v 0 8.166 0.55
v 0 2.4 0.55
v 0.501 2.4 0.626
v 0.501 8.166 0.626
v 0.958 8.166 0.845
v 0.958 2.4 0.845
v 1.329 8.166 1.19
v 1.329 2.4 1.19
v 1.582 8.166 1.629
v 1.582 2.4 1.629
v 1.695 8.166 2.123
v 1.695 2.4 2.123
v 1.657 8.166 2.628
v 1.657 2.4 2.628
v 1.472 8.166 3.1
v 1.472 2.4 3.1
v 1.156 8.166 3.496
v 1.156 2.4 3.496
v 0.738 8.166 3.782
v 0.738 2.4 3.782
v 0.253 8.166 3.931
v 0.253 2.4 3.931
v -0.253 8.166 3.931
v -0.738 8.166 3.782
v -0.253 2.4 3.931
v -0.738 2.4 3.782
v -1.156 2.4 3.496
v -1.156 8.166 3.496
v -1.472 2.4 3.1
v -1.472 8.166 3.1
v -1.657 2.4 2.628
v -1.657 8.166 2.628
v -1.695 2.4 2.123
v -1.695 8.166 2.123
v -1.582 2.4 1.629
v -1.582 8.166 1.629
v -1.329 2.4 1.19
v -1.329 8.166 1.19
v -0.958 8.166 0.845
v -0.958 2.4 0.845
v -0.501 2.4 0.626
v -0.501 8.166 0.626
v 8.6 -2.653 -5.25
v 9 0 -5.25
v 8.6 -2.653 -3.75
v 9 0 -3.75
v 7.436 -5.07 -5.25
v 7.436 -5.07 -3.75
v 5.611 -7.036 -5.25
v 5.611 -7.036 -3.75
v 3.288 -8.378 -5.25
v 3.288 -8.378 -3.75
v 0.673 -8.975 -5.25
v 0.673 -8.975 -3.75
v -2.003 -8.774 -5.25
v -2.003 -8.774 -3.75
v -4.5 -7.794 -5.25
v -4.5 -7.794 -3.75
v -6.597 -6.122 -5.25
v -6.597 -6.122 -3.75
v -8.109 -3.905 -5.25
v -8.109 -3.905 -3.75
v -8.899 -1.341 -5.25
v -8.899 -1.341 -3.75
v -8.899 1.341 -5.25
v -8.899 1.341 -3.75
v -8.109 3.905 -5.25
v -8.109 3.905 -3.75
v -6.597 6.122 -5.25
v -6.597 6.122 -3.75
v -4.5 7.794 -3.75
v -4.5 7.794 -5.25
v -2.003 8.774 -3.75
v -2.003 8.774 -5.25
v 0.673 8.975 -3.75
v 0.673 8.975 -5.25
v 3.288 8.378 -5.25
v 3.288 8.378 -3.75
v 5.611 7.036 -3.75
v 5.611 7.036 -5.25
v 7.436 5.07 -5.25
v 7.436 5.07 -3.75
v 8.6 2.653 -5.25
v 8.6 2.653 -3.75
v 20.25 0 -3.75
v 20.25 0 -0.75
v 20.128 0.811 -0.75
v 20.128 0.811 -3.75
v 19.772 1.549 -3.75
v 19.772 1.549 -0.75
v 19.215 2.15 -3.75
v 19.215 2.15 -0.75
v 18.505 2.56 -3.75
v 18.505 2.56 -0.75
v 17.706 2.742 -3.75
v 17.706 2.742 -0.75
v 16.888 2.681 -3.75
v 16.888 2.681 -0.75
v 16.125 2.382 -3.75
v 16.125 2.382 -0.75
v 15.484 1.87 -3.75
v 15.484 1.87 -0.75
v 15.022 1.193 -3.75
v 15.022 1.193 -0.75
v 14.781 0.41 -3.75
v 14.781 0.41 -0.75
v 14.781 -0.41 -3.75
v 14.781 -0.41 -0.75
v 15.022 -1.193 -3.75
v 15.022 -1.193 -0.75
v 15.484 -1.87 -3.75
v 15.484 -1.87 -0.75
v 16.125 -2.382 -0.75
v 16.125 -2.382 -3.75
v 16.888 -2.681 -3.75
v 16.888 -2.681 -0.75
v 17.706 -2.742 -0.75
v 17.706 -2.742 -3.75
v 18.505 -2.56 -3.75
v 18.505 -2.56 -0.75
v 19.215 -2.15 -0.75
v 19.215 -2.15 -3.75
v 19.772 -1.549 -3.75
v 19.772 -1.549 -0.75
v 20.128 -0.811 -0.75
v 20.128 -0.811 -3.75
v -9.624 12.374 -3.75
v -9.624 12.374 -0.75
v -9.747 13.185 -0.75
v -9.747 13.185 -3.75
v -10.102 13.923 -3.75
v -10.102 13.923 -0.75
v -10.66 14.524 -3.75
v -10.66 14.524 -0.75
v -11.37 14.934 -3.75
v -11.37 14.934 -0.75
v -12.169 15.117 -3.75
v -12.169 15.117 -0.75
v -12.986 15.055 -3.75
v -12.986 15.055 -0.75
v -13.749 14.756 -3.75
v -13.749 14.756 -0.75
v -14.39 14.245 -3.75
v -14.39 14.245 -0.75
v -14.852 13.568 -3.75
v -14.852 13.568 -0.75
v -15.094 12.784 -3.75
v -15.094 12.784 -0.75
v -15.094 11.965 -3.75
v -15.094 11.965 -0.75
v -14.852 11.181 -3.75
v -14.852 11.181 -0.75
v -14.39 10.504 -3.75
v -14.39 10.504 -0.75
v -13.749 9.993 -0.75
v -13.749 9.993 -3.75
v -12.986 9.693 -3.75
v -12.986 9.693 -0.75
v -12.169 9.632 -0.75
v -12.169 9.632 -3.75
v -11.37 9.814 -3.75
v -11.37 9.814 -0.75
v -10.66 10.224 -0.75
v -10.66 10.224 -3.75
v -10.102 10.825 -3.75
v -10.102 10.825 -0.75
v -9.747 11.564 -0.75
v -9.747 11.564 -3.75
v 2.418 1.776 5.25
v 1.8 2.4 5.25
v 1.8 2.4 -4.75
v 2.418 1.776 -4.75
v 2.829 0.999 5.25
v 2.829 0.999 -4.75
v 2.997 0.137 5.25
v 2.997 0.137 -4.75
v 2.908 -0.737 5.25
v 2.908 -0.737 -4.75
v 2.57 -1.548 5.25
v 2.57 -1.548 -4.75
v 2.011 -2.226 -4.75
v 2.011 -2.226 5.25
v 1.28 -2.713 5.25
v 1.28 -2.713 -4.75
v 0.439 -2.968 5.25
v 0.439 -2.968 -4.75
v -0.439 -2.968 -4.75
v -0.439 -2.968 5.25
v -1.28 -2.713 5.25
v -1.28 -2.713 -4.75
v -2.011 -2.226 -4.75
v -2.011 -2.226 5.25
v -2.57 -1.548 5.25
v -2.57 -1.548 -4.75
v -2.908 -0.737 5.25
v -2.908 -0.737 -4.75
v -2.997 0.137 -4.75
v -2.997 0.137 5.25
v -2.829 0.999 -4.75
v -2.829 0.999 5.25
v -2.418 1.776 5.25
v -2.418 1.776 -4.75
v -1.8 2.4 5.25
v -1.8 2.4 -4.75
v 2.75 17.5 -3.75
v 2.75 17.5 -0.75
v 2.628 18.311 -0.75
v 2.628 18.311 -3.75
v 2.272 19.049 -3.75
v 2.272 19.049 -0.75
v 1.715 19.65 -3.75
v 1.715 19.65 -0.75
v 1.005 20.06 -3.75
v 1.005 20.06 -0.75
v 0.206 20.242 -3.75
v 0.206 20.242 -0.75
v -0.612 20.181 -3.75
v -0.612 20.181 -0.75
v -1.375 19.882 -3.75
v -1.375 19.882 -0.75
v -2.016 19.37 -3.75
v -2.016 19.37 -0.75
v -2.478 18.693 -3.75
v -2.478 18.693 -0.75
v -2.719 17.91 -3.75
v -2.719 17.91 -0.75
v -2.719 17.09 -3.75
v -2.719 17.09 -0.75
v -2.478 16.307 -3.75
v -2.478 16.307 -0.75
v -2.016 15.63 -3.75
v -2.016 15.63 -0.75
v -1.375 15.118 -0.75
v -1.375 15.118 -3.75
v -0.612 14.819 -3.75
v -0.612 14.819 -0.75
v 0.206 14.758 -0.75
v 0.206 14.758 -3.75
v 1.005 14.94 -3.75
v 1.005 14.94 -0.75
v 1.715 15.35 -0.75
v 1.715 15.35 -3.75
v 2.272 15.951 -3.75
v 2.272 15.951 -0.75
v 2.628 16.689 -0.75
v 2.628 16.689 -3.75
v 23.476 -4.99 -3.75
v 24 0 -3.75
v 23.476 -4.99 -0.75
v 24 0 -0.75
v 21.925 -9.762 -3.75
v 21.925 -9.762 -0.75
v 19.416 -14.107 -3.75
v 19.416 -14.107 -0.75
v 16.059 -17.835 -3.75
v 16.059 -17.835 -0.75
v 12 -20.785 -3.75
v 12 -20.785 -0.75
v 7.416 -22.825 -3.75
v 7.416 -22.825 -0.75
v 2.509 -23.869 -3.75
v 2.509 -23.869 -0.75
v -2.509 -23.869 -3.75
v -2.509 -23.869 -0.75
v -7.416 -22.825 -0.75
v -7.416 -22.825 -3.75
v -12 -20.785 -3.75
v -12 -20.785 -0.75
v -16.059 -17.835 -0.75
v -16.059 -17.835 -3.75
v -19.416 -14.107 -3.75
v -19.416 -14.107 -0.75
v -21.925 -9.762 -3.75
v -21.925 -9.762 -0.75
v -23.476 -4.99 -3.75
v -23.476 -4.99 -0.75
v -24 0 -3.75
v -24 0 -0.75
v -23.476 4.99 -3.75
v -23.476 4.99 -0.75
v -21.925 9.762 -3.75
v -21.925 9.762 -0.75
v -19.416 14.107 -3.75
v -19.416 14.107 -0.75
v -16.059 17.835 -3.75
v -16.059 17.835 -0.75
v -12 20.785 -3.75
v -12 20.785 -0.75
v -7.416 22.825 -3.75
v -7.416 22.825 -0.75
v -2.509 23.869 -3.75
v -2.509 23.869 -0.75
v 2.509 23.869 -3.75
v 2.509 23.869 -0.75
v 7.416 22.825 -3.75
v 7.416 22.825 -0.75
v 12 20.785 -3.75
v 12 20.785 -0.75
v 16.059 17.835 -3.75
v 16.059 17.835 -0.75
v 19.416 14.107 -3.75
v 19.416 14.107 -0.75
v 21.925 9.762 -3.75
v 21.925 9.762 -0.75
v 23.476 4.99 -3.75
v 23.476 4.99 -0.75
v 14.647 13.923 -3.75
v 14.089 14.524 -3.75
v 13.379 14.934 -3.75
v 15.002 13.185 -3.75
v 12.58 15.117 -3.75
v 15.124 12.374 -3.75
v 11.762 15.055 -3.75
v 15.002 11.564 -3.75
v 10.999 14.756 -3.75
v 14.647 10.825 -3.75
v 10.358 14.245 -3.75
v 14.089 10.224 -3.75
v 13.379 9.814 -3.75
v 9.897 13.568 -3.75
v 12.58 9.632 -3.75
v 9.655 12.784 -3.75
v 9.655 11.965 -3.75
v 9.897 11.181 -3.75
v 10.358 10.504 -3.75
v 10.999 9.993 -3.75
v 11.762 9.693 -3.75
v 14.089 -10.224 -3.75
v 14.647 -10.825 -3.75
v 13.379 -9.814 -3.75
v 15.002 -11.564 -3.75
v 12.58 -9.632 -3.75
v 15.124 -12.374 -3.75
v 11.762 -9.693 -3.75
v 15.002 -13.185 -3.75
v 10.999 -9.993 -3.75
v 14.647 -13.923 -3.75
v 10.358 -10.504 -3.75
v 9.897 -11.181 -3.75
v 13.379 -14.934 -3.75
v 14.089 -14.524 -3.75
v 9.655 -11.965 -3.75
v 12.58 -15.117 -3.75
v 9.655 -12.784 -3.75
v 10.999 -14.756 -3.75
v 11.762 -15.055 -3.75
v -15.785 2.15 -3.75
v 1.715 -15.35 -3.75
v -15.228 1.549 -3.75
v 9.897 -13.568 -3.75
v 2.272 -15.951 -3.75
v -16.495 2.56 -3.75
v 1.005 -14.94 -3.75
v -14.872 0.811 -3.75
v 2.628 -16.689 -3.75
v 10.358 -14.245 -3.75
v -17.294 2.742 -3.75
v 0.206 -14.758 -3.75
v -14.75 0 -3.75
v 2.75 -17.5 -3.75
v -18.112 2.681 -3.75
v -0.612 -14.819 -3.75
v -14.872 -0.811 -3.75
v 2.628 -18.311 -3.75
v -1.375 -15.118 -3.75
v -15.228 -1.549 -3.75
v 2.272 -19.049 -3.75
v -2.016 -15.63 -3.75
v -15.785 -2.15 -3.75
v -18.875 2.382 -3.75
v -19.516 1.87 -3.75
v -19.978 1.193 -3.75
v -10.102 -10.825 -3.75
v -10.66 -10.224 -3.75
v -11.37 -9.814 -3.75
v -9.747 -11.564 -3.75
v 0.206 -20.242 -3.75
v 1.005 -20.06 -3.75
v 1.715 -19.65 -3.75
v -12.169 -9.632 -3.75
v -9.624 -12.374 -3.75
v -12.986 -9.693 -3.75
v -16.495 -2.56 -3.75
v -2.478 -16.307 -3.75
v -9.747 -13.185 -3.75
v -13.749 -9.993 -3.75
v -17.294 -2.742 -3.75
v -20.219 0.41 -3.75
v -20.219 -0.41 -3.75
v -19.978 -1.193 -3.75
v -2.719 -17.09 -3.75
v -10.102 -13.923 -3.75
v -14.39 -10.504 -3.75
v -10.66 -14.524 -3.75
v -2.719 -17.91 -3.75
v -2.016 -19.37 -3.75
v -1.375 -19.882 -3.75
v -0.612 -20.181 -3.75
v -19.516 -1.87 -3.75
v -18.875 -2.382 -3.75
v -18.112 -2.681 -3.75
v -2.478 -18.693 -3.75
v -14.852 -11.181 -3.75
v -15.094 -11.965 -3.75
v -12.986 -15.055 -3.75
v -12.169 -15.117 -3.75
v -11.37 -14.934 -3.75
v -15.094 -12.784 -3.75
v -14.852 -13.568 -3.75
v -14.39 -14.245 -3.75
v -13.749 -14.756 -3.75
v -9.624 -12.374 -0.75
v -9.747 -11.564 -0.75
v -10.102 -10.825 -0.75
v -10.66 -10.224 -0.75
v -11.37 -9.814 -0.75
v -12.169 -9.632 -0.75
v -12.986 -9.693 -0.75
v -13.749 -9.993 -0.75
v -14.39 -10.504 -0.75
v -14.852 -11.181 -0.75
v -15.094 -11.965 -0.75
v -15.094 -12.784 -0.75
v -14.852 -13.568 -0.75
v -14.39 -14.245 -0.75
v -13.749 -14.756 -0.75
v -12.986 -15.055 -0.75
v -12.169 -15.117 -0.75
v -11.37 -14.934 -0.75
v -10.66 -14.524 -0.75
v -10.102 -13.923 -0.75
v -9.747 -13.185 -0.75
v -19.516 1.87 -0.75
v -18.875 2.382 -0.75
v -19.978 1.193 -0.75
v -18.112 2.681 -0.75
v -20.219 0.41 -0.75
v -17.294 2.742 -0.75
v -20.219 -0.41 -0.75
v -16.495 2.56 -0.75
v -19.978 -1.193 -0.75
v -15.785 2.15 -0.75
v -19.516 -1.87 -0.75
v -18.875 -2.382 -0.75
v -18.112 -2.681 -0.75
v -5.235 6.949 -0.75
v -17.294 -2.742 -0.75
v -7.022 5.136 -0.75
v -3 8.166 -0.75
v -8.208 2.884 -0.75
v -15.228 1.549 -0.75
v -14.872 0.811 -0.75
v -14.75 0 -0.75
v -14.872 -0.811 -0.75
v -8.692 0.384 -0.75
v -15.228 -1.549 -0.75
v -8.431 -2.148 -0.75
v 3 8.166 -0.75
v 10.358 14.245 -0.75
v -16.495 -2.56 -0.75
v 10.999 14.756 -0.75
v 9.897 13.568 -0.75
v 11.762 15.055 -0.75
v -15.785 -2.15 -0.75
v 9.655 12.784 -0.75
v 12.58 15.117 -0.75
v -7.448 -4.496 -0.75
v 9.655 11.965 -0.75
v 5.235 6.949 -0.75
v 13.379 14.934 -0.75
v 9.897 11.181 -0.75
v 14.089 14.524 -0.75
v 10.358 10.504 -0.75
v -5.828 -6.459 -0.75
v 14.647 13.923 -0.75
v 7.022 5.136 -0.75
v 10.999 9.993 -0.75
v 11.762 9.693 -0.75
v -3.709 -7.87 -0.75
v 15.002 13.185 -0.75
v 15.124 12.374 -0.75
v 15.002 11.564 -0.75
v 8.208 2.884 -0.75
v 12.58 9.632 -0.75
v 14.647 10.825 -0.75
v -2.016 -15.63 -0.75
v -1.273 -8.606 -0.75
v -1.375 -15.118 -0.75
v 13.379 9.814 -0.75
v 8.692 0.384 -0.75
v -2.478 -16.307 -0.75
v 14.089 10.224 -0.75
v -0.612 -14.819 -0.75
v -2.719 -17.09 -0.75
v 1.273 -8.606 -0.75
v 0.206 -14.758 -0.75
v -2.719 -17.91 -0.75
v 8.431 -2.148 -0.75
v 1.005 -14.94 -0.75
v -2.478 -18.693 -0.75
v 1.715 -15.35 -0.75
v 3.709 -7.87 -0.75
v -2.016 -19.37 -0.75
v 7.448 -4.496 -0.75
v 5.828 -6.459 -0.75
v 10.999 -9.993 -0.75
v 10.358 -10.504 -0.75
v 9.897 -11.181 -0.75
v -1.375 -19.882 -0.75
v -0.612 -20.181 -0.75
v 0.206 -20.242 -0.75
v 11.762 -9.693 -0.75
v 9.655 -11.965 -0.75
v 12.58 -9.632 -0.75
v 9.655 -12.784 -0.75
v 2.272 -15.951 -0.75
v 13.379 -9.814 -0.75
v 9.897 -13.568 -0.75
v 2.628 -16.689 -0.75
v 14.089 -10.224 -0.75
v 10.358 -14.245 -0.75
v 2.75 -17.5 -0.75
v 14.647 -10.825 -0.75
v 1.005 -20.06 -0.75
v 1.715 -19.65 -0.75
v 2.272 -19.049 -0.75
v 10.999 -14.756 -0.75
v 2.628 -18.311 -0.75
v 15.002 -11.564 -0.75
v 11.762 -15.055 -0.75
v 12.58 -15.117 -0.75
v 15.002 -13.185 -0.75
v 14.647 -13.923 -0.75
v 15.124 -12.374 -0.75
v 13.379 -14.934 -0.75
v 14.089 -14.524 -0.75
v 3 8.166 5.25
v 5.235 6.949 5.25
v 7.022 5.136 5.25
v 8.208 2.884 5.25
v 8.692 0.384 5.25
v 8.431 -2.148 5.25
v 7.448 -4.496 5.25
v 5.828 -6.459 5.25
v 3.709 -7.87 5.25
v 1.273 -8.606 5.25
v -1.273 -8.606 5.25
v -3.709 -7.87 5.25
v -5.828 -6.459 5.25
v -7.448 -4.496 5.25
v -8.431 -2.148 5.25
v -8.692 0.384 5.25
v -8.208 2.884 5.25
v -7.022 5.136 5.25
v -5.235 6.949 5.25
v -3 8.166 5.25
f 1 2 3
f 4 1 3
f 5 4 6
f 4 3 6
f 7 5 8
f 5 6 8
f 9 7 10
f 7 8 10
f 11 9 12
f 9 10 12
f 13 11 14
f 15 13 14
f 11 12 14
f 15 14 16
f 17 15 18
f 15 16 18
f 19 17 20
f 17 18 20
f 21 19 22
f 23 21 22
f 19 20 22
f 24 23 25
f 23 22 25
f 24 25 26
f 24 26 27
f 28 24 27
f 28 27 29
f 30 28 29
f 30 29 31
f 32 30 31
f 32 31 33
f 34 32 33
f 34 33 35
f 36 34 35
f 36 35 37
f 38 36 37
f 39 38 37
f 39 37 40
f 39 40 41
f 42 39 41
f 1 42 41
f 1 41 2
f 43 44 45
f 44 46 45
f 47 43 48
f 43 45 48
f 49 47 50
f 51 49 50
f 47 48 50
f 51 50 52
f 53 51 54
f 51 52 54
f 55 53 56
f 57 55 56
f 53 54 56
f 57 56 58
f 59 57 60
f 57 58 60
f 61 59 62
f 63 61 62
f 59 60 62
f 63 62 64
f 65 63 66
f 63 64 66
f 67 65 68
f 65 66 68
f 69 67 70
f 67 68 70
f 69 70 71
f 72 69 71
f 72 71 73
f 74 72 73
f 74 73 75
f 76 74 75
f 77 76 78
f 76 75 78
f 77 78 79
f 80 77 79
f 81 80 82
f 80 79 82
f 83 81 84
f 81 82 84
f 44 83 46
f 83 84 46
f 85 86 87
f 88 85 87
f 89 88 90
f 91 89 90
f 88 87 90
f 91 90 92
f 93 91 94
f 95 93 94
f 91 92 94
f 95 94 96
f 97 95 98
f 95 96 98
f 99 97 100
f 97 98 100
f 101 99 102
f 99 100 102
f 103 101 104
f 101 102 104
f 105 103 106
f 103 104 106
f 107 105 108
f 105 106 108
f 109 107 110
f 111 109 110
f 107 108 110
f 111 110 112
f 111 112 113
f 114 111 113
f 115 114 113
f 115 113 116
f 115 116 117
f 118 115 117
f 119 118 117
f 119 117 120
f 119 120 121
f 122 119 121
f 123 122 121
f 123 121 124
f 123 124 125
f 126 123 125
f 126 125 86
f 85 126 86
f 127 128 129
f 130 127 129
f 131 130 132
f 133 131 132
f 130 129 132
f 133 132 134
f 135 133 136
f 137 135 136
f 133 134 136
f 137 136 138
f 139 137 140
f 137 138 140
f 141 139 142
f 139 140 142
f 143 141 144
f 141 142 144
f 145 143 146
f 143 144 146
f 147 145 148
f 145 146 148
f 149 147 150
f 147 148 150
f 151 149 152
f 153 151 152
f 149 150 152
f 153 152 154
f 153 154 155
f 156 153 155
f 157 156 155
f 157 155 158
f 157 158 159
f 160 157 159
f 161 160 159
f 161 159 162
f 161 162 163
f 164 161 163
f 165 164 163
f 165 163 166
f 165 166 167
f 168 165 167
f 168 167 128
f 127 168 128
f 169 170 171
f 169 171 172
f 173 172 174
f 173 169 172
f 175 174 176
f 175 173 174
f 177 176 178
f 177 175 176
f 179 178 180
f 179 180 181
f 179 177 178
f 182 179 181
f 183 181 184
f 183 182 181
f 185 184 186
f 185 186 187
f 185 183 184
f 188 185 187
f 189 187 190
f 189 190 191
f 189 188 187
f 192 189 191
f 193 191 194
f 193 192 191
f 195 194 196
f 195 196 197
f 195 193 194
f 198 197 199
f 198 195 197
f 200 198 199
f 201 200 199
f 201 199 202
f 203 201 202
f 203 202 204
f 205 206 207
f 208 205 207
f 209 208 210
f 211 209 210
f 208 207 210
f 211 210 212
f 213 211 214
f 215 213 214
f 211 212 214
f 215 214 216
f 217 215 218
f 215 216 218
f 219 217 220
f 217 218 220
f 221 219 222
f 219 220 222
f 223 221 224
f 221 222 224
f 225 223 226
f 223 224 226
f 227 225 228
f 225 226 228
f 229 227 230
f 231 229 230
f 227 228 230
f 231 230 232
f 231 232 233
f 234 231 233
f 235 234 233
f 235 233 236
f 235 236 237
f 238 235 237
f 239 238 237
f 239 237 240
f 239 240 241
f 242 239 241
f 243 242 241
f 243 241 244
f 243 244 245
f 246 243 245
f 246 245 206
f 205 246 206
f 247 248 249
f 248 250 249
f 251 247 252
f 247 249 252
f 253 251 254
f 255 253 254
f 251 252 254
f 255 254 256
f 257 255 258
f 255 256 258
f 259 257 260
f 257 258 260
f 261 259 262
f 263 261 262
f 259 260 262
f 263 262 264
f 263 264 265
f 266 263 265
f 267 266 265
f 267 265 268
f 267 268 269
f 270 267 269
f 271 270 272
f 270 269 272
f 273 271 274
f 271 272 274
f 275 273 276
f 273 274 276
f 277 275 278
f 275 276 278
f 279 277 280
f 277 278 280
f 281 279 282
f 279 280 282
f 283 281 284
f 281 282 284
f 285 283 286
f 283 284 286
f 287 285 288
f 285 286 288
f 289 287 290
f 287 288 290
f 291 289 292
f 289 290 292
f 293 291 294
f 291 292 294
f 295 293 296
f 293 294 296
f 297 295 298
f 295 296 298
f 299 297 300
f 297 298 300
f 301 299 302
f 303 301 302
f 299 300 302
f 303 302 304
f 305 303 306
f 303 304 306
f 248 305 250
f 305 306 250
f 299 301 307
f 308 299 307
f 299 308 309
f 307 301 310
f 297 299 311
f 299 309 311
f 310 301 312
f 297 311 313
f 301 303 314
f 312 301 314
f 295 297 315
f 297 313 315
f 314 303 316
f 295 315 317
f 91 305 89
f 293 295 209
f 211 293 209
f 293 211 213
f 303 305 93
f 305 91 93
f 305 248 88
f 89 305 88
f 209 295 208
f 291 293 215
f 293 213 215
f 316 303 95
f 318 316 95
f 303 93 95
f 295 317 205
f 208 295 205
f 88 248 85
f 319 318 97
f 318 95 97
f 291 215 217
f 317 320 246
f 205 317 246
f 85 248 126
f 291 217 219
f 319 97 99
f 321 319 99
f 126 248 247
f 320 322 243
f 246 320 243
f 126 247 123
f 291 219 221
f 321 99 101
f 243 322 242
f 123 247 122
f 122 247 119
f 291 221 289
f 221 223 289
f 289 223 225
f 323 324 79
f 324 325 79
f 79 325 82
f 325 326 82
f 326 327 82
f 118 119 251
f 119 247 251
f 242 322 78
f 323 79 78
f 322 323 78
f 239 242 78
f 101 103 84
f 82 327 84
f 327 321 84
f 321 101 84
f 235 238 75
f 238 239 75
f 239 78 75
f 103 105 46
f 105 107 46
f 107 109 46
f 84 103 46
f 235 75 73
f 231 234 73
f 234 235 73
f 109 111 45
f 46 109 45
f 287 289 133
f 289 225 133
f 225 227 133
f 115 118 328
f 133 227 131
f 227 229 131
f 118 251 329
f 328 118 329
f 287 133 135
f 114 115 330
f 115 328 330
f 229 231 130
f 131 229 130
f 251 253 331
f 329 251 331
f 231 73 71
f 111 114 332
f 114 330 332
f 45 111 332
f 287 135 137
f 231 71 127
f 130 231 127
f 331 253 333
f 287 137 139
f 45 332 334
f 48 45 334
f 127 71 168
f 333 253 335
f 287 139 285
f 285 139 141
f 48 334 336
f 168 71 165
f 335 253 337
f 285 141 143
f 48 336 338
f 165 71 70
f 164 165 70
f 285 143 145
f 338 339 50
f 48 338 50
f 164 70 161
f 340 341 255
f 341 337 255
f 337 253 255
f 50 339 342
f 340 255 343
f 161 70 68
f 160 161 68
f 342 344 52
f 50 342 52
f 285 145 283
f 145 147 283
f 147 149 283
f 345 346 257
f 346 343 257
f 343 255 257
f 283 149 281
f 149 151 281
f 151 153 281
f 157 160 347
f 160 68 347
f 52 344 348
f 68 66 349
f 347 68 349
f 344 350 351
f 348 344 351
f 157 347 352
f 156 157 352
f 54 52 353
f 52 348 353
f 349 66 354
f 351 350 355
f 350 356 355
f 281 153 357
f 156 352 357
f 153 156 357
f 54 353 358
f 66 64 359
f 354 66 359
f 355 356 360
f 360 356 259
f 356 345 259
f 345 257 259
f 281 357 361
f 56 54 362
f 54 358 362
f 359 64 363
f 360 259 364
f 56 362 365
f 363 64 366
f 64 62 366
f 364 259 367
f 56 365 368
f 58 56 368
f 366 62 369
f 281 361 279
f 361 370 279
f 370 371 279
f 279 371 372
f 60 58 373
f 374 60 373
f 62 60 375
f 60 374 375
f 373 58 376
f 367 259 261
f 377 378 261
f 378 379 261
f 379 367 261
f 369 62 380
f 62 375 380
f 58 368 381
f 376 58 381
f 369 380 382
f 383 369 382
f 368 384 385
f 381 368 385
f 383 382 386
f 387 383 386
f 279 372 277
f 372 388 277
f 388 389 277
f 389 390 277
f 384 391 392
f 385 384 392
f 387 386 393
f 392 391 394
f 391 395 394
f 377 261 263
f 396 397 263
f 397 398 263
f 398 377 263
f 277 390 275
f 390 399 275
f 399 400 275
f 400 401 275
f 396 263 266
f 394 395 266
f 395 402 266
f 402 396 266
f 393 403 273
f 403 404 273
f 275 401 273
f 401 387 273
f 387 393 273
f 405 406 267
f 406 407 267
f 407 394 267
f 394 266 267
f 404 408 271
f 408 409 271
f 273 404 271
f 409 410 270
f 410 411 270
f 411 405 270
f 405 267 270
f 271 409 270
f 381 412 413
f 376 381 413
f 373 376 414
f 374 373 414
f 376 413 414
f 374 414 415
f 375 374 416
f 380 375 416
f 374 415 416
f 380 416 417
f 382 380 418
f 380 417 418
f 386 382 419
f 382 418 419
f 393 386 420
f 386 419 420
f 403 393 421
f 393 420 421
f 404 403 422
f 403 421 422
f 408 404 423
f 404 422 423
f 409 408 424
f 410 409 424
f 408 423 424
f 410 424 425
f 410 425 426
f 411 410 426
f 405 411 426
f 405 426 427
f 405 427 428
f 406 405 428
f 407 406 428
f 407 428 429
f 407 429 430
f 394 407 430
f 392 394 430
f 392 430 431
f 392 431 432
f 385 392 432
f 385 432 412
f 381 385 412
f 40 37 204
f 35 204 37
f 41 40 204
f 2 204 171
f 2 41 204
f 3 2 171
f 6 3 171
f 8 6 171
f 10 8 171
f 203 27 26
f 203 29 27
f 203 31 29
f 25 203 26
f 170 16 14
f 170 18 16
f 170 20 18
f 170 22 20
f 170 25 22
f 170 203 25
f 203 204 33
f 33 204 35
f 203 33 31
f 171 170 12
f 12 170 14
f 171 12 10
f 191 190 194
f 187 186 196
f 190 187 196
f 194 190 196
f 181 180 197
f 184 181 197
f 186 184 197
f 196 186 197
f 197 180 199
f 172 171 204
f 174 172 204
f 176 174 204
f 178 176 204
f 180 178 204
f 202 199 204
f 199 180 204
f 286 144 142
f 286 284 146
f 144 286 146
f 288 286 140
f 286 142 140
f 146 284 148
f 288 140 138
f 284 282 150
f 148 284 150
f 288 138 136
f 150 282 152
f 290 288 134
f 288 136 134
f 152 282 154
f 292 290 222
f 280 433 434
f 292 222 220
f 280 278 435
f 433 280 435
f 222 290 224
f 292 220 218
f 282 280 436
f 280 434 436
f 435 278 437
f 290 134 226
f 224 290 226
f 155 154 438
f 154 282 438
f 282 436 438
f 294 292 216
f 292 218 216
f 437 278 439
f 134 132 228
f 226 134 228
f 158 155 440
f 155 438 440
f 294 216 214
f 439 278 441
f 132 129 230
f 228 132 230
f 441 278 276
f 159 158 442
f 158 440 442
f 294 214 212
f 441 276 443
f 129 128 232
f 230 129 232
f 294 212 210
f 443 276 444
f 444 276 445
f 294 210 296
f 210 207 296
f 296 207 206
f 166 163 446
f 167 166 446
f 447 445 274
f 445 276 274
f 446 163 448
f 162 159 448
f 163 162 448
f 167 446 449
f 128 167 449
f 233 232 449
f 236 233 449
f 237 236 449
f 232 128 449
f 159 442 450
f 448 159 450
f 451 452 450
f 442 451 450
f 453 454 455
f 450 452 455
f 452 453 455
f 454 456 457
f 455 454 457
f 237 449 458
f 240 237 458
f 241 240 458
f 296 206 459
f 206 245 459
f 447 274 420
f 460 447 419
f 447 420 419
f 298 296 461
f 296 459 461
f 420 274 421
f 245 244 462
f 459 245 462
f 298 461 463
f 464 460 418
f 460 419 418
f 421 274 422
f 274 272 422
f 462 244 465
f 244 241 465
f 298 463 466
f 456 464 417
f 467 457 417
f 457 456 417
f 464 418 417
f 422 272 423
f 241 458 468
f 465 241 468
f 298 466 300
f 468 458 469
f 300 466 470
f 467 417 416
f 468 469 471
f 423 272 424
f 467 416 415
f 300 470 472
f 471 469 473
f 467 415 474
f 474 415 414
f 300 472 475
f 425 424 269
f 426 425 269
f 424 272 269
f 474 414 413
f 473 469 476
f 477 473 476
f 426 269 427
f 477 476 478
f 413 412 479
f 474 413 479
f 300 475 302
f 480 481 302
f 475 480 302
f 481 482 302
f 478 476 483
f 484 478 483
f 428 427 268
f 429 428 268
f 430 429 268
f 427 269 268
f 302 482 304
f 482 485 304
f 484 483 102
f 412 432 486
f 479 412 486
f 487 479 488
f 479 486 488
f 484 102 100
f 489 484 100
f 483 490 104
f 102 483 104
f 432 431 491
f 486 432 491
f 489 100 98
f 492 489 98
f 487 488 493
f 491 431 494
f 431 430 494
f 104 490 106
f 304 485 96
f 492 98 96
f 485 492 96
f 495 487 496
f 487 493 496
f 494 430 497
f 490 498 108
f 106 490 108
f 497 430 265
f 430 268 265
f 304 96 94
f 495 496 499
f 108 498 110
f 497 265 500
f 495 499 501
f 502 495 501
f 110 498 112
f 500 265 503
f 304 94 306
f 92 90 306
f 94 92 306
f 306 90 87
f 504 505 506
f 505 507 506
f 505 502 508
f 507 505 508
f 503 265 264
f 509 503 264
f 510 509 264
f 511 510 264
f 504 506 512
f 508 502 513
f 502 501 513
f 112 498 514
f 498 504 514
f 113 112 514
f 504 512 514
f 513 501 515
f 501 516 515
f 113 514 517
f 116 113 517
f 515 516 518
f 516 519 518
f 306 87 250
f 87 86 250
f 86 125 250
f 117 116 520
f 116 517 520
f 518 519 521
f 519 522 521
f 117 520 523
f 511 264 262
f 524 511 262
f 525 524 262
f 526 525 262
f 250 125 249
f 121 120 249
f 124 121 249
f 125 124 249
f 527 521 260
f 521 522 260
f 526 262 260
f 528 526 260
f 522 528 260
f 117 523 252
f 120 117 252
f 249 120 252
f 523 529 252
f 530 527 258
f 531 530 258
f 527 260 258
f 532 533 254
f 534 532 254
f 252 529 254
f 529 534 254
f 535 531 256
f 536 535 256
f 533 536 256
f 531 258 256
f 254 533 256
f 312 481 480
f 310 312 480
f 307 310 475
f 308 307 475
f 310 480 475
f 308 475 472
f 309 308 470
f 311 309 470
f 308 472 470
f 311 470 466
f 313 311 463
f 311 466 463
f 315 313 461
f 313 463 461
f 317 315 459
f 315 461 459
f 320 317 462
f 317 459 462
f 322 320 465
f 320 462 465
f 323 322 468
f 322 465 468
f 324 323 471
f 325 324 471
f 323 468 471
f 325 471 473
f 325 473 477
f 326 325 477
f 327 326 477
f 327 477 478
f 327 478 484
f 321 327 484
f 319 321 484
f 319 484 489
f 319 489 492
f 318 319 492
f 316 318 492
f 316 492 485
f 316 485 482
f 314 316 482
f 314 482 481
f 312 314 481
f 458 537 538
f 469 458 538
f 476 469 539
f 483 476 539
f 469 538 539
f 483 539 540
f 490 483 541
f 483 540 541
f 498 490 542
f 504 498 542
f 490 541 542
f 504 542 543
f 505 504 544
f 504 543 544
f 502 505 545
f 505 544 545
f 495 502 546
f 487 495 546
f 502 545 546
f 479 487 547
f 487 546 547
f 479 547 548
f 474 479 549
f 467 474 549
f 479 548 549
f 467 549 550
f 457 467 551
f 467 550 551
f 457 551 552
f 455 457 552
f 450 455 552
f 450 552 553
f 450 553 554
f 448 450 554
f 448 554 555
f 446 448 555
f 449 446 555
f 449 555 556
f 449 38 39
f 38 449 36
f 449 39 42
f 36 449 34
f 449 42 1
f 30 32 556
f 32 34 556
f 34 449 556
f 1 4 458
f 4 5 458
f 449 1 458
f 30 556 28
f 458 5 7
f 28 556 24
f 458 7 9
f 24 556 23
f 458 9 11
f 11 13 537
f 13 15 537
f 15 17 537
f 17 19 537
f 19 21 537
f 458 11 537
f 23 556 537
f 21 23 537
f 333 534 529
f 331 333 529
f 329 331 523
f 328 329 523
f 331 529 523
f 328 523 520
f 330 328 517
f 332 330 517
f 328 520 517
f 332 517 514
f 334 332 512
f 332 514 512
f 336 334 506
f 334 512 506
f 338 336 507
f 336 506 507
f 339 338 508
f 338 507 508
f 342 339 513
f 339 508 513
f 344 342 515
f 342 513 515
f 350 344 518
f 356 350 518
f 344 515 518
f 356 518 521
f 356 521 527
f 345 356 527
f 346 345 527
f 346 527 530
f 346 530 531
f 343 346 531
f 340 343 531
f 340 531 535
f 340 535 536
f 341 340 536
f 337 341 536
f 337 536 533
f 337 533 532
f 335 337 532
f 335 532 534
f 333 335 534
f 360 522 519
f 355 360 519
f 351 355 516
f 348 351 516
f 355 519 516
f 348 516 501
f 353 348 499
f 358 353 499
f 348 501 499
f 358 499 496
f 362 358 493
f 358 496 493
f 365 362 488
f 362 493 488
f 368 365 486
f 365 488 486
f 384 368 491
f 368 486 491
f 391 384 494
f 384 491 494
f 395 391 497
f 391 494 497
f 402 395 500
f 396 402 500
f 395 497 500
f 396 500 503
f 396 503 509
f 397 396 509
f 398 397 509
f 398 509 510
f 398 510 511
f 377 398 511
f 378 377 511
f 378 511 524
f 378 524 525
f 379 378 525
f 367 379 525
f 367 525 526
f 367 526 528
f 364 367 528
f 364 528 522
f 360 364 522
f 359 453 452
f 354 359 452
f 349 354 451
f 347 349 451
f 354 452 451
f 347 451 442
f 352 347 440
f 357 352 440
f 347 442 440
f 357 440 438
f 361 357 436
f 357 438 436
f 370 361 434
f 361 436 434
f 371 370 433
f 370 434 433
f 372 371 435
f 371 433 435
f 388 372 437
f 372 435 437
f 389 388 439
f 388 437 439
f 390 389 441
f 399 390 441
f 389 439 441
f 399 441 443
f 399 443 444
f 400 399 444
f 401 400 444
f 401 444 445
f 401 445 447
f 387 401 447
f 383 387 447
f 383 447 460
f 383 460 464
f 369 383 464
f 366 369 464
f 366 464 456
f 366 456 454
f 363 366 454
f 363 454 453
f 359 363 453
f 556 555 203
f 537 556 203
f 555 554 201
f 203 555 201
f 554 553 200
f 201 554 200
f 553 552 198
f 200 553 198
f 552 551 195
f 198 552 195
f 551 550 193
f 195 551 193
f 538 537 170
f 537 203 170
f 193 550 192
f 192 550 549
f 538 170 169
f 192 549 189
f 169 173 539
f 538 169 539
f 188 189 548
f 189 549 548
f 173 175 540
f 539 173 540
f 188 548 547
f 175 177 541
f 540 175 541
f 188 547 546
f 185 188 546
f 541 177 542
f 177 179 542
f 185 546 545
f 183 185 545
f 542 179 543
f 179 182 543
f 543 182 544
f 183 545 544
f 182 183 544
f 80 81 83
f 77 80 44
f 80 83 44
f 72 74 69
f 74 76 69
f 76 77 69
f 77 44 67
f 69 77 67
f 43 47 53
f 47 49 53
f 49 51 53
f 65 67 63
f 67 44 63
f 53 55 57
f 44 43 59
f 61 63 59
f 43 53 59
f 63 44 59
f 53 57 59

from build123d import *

# Parameters (mm, degrees)
CORTAR_EXTRUIR1_DEPTH            = 10
TALADRO_DE_MARGEN_PARA_M51_D     = 5.5
CORTAR_EXTRUIR2_DEPTH            = 6
TALADRO_DE_MARGEN_PARA_M31_D     = 3.4
TALADRO_DE_MARGEN_PARA_M31_DEPTH = 5.766394553


with BuildPart() as part:
    # Croquis1 → Revolución1 (revolve)
    with BuildSketch(Plane(origin=(0, 0, 0), x_dir=(0, 0, -1), z_dir=(1, 0, 0)), mode=Mode.PRIVATE) as revoluci_n1_sk:
        Polygon((-5.25, 0), (5.25, 0), (5.25, 9), (3.75, 9), (3.75, 24), (0.75, 24), (0.75, 8.7), (-5.25, 8.7), align=None)
    revolve(revoluci_n1_sk.sketch.rotate(Axis((0, 0, 25.623234534), (0, 0, -1)), 90), axis=Axis((0, 0, 25.623234534), (0, 0, -1)))

    # Croquis2 → Cortar-Extruir1 (cut)
    with BuildSketch(Plane.XY.offset(5.25)):
        with BuildLine():
            Line((-1.8, 2.4), (1.8, 2.4))
            ThreePointArc((1.8, 2.4), (0, -3), (-1.8, 2.4))
        make_face()
    extrude(amount=-CORTAR_EXTRUIR1_DEPTH, mode=Mode.SUBTRACT)

    # Taladro de margen para M51 (through all)
    with Locations(Plane(origin=(0, 17.5, -3.75), x_dir=(-1, 0, 0), z_dir=(0, 0, -1))):
        with Locations((0, 0), (12.374368671, -5.125631329), (17.5, -17.5), (12.374368671, -29.874368671), (0, -35), (-12.374368671, -29.874368671), (-17.5, -17.5), (-12.374368671, -5.125631329)):
            Hole(TALADRO_DE_MARGEN_PARA_M51_D / 2)

    # Croquis10 → Cortar-Extruir2 (cut)
    with BuildSketch(Plane.XY.offset(5.25)):
        with BuildLine():
            Line((-3, 8.166394553), (3, 8.166394553))
            ThreePointArc((3, 8.166394553), (0, 8.7), (-3, 8.166394553))
        make_face()
    extrude(amount=-CORTAR_EXTRUIR2_DEPTH, mode=Mode.SUBTRACT)

    # Taladro de margen para M31
    with Locations(Plane(origin=(0, 8.166394553, 2.25), x_dir=(0, 0, 1), z_dir=(0, 1, 0))):
        with Locations((0, 0)):
            Hole(TALADRO_DE_MARGEN_PARA_M31_D / 2, depth=TALADRO_DE_MARGEN_PARA_M31_DEPTH)


solid = part.part
